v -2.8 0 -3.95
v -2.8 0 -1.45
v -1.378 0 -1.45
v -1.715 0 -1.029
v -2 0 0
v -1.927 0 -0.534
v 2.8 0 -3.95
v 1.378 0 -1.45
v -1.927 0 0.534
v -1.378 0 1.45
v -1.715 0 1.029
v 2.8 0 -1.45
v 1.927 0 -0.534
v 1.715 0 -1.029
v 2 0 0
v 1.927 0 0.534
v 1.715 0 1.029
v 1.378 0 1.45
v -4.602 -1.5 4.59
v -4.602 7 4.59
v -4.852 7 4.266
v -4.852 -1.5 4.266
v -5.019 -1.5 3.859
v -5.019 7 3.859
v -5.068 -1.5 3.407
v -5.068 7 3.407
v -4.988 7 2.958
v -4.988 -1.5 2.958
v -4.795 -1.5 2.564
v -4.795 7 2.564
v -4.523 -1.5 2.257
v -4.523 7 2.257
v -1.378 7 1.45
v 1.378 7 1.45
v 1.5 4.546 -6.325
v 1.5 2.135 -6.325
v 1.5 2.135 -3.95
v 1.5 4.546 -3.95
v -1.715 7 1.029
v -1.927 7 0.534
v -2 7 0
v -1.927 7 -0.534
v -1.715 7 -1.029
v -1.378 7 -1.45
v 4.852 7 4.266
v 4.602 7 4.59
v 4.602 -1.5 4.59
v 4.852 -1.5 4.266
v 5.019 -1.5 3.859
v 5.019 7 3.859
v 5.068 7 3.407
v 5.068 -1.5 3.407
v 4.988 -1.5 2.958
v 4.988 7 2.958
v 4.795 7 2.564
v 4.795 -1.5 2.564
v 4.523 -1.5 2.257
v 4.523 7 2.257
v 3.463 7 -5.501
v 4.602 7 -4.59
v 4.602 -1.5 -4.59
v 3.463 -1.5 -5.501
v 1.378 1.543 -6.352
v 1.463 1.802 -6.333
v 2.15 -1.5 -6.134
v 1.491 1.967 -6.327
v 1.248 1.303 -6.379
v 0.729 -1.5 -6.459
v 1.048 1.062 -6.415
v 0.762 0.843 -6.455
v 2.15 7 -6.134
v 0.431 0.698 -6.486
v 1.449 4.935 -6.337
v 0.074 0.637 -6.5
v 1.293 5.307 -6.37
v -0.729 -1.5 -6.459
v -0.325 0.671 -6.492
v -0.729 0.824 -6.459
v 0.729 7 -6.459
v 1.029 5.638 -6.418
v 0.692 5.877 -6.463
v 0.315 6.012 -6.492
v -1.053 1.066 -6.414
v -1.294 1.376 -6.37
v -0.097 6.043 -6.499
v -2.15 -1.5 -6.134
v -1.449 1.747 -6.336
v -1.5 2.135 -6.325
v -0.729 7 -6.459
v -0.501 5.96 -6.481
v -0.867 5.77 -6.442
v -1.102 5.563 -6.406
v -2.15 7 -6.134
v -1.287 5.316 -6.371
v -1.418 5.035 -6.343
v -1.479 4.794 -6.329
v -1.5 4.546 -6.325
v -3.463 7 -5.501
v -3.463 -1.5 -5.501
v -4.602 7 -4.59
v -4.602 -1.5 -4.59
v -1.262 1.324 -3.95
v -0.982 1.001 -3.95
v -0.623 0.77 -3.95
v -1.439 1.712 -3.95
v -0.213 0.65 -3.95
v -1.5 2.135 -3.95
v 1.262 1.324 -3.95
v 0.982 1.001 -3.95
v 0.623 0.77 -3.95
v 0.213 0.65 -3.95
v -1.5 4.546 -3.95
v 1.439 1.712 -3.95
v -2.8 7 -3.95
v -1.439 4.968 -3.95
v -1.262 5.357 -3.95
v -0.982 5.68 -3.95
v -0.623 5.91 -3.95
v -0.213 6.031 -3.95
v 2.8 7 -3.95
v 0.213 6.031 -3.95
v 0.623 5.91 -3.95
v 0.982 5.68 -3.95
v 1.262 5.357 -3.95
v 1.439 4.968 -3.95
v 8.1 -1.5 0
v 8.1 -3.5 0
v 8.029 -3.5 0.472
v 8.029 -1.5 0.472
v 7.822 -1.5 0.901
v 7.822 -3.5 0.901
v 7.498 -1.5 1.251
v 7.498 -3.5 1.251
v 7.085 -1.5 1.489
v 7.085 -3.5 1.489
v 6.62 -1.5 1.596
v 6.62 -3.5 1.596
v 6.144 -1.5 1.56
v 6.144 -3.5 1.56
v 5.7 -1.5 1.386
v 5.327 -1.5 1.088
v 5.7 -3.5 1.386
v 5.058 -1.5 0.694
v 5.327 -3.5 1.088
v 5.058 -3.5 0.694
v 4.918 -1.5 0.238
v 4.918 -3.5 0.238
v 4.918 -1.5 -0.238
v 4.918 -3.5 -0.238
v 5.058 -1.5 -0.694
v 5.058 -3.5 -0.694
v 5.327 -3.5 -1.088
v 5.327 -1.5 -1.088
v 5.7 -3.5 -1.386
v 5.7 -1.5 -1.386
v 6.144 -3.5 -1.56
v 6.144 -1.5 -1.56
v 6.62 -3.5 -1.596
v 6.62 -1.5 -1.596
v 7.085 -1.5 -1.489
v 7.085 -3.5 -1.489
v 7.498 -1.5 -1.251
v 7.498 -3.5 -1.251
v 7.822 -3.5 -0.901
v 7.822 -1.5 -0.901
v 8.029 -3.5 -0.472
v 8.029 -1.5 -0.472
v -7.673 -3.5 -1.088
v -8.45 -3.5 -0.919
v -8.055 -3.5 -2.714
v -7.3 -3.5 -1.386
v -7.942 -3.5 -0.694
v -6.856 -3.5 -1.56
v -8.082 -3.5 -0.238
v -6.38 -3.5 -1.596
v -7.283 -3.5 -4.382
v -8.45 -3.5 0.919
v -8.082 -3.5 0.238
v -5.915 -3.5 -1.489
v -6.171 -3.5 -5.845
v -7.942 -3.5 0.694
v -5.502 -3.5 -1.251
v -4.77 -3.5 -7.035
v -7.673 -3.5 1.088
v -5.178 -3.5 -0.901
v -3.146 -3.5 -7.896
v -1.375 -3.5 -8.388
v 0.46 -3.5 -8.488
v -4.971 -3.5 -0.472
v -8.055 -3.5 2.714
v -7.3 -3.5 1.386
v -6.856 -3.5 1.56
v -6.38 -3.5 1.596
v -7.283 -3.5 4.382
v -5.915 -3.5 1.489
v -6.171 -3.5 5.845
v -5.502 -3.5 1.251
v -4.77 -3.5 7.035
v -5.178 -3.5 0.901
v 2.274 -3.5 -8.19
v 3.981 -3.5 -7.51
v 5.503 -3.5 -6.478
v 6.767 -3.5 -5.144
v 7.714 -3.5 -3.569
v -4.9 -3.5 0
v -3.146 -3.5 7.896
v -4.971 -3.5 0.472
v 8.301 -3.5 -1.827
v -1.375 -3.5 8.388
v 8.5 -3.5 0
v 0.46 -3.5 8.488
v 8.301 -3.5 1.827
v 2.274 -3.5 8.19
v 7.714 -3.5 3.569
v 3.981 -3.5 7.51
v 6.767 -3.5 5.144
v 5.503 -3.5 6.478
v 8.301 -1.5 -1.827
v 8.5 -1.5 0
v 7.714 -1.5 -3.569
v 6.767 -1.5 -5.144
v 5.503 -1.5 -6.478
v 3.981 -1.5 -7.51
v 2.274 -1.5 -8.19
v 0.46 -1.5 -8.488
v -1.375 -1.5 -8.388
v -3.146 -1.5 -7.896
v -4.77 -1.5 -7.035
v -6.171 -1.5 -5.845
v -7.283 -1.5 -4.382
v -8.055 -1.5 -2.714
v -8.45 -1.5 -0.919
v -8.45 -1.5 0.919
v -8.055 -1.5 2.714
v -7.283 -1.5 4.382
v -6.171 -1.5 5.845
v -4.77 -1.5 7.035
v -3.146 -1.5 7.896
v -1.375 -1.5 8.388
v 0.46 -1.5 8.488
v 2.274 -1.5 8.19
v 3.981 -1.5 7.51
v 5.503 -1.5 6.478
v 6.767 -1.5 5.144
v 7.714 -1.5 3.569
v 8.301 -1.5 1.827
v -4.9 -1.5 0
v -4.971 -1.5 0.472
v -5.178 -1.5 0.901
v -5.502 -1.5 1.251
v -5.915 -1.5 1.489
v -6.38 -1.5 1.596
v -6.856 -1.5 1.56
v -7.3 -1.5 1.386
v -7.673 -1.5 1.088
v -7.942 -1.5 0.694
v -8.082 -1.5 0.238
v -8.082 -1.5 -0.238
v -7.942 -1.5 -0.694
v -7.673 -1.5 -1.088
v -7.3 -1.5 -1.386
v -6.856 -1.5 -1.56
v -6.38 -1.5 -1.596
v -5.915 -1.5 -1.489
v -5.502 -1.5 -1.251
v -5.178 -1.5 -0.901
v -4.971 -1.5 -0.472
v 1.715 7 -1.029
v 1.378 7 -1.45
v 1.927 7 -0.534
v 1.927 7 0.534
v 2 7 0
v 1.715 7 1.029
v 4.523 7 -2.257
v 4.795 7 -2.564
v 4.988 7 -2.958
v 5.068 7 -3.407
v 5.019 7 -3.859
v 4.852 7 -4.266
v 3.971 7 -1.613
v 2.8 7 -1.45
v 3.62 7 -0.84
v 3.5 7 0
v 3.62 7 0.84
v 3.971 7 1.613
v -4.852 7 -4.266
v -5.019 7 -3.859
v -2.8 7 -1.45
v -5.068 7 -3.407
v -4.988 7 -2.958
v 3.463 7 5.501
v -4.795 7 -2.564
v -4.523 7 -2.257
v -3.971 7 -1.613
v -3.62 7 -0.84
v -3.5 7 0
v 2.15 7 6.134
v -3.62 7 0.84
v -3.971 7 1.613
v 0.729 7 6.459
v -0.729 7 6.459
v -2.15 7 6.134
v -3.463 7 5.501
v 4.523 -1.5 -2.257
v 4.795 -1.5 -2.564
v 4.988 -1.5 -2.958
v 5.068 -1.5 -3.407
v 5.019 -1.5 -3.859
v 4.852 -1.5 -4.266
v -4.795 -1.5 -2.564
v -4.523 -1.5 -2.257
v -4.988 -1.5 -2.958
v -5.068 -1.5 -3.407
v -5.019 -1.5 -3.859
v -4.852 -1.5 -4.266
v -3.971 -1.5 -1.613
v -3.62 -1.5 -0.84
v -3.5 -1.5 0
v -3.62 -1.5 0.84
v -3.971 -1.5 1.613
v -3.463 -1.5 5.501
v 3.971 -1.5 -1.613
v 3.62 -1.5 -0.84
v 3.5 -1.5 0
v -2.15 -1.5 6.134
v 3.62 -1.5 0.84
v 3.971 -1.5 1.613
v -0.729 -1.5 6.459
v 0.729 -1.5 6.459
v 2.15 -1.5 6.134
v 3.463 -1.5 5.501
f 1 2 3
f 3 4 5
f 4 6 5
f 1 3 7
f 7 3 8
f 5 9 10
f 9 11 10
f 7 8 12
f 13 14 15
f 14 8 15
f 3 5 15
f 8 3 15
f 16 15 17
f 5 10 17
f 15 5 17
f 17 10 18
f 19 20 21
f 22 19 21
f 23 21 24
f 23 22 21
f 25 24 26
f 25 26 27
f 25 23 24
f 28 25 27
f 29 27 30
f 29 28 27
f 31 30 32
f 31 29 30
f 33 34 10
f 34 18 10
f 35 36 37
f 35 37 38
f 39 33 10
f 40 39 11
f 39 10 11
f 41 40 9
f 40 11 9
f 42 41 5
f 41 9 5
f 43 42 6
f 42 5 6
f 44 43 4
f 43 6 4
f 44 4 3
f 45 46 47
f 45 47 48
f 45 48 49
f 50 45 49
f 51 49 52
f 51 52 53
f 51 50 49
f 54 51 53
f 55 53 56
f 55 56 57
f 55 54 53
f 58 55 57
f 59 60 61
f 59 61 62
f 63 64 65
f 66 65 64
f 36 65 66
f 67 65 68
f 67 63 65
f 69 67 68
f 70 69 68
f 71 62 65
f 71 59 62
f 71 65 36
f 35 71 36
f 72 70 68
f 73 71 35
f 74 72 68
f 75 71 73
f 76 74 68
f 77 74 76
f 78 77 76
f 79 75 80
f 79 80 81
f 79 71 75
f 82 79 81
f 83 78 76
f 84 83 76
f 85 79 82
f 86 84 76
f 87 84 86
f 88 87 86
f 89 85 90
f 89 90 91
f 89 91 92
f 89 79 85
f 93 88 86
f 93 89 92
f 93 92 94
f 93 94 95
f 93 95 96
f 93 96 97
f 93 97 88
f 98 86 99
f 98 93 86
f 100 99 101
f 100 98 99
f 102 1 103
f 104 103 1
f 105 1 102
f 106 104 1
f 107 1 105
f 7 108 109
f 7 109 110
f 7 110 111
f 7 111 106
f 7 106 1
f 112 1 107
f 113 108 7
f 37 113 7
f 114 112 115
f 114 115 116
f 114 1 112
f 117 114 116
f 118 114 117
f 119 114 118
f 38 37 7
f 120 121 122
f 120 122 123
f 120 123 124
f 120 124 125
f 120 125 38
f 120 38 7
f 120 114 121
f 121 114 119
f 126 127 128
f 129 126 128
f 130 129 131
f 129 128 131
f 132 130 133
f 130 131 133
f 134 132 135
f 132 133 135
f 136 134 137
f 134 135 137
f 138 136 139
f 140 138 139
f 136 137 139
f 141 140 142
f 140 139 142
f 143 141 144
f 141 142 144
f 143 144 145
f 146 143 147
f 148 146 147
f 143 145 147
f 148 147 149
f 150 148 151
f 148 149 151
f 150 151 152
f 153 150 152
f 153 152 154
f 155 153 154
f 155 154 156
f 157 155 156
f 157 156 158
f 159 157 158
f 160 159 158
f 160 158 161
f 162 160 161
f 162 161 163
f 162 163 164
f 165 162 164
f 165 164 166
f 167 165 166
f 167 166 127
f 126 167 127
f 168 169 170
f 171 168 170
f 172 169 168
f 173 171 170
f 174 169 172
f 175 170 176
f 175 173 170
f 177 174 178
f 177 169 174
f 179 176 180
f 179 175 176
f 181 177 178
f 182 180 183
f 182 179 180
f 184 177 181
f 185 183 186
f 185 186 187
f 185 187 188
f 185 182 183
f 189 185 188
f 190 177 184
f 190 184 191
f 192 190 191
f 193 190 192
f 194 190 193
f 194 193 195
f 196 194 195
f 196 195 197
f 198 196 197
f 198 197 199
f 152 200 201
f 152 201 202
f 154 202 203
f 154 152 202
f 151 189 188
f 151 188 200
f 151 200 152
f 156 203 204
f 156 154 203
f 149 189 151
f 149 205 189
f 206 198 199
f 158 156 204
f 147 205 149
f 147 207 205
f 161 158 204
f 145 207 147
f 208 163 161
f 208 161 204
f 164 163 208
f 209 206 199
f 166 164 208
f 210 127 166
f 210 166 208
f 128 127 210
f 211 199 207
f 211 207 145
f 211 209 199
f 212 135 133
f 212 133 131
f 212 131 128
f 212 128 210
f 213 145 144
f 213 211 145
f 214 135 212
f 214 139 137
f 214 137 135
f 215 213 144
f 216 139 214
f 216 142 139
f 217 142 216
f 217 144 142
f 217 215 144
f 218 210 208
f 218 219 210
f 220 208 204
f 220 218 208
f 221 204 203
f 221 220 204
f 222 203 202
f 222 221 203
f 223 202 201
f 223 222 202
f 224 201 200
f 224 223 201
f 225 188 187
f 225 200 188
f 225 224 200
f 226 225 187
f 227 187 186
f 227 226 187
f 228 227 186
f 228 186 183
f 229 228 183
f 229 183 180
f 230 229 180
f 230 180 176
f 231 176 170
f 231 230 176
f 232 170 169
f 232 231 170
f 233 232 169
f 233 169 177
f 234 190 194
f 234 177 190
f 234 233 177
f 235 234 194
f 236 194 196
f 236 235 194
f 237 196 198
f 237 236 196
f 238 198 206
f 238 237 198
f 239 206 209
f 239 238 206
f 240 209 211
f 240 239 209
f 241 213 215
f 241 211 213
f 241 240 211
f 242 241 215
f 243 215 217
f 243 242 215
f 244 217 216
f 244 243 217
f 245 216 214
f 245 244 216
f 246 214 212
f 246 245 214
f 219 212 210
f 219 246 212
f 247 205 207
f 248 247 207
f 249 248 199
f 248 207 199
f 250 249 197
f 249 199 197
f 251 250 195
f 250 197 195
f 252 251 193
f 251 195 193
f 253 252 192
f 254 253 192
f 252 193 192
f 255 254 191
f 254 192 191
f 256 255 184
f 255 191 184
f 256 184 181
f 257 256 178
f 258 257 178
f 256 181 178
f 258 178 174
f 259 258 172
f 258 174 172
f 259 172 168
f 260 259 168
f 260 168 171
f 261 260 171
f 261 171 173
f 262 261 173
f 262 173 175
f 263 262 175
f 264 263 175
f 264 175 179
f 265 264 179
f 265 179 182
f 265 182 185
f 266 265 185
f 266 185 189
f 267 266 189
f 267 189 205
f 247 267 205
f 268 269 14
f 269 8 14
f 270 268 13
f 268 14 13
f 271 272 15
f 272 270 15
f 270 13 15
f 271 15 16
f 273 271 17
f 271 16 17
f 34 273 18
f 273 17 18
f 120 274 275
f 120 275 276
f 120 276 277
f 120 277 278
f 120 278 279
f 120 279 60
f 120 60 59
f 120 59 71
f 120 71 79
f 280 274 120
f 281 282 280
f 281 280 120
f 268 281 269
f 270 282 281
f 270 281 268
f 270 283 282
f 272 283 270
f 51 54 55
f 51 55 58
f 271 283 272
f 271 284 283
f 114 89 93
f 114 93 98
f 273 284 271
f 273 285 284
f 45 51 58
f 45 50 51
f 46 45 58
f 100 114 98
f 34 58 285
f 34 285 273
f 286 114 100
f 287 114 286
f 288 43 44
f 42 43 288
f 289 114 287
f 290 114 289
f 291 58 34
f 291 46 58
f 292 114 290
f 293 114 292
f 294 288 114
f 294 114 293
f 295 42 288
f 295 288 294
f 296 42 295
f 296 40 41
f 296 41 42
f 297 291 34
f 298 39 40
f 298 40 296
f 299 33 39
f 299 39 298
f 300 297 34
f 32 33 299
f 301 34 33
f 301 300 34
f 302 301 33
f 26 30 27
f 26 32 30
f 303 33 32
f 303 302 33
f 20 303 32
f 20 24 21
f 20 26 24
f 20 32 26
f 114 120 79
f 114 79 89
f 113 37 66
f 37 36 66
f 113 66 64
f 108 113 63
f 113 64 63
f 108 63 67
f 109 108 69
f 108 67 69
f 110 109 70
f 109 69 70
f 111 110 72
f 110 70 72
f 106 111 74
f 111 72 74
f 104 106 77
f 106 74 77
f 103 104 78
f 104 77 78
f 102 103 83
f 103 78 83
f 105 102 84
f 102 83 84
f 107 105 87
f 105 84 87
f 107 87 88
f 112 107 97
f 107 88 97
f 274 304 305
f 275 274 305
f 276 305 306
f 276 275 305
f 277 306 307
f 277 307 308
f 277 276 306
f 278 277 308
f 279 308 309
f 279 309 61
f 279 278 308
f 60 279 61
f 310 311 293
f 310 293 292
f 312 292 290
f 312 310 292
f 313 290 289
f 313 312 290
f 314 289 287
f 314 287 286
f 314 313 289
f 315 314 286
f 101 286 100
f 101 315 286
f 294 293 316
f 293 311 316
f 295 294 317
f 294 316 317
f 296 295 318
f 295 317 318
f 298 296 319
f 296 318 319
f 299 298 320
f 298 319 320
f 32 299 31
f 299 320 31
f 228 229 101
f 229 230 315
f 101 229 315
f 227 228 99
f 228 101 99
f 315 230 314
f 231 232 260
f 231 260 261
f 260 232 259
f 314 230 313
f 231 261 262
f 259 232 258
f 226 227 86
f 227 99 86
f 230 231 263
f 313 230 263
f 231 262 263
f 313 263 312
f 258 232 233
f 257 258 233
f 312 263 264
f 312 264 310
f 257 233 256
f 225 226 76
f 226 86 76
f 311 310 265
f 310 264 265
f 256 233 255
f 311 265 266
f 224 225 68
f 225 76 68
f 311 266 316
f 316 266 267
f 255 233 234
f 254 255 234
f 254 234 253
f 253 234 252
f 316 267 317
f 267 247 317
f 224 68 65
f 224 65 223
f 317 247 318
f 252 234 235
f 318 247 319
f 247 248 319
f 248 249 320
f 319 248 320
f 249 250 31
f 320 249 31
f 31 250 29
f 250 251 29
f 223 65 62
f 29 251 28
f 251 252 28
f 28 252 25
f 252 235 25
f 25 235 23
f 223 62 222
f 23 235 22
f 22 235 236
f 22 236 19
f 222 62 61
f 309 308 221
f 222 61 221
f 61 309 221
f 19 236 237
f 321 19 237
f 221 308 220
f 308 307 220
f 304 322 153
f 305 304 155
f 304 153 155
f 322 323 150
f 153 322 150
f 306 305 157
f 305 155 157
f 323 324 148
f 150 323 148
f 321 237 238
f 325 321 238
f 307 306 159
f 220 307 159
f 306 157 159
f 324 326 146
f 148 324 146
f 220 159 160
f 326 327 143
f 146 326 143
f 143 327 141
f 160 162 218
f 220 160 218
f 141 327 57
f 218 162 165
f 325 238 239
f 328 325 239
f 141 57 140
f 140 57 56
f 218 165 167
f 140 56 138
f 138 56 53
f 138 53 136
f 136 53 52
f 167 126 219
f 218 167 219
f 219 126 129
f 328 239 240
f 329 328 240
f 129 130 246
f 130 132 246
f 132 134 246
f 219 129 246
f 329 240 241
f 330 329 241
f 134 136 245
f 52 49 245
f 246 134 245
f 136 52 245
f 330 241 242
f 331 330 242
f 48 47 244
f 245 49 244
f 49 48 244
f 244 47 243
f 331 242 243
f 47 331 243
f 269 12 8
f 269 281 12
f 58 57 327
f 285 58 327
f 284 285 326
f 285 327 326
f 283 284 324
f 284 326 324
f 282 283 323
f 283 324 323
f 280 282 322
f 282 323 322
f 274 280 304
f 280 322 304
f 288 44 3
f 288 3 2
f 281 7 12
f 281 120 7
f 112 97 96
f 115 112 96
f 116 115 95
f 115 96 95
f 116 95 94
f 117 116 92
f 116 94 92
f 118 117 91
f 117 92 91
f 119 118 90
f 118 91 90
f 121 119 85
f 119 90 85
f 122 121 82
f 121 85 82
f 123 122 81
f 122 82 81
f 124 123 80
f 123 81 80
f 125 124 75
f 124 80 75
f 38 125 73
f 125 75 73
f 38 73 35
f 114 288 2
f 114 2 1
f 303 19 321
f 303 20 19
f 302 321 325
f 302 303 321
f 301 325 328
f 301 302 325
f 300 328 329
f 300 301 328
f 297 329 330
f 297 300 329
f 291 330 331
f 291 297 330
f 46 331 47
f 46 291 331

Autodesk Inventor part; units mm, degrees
ref_plane "YZ Plane" through (0, 0, 0) normal (1, 0, 0) x (0, 1, 0)
ref_plane "XZ Plane" through (0, 0, 0) normal (0, 1, 0) x (-1, 0, 0)
sketch "Sketch1" plane through (0, 0, 0) normal (0, 1, 0) x (-1, 0, 0)
  circle A0 centre (0, 0) radius 4.5
  circle A1 centre (0, 0) radius 2
  circle A2 centre (0, 0) radius 1.45
  line L0 (0, -1.45) -> (1.3775, -1.45)
  line L1 (0, -1.45) -> (-1.3775, -1.45)
  line L2 (0, 1.45) -> (-1.3775, 1.45)
  line L3 (0, 1.45) -> (1.3775, 1.45)
  dimension "d0" = 9
  dimension "d1" = 4
  dimension "d2" = 2.9
extrude "Extrusion1" add sketch "Sketch1" along normal blind 7 contours A0 | L3 L2 A1 | A1 L1 L0
sketch "Sketch2" plane through (0, 7, 0) normal (0, 1, 0) x (1, 0, 0)
  line L0 (-1.3775, 1.45) -> (1.3775, 1.45) projected
  line L1 (0, 1.45) -> (0, 3.85)
  line L2 (1.3775, -0.95) -> (-1.3775, -0.95)
  line L3 (-1.3775, -0.95) -> (-1.3775, 3.85)
  line L4 (-1.3775, 3.85) -> (1.3775, 3.85)
  line L5 (1.3775, 3.85) -> (1.3775, -0.95)
  line L6 (1.3775, -0.95) -> (-1.3775, 3.85) construction
  line L7 (-1.3775, -0.95) -> (1.3775, 3.85) construction
  line L8 (2.75, -0.95) -> (-2.75, -0.95)
  line L9 (-2.75, -0.95) -> (-2.75, 3.85)
  line L10 (-2.75, 3.85) -> (2.75, 3.85)
  line L11 (2.75, 3.85) -> (2.75, -0.95)
  line L12 (2.75, -0.95) -> (-2.75, 3.85) construction
  line L13 (-2.75, -0.95) -> (2.75, 3.85) construction
  circle A0 centre (0, 0) radius 6.5
  circle A1 centre (0, 0) radius 4.5
  dimension "d5" = 2.4
  dimension "d6" = 5.5
  dimension "d7" = 13
extrude "Extrusion2" add sketch "Sketch2" against normal blind 7 contours A1 L9 L10 | L10 L11 A1 | A0
sketch "Sketch3" plane through (0, 7, 0) normal (0, 1, 0) x (1, 0, 0)
  line L0 (-1.3775, 1.45) -> (1.3775, 1.45) projected
  line L1 (0, 1.45) -> (0, 3.95)
  line L2 (2.8, -1.05) -> (-2.8, -1.05)
  line L3 (-2.8, -1.05) -> (-2.8, 3.95)
  line L4 (-2.8, 3.95) -> (2.8, 3.95)
  line L5 (2.8, 3.95) -> (2.8, -1.05)
  line L6 (2.8, -1.05) -> (-2.8, 3.95) construction
  line L7 (-2.8, -1.05) -> (2.8, 3.95) construction
  line L8 (0, 1.45) -> (-2.8, 1.45)
  line L9 (0, 1.45) -> (2.8, 1.45)
  point P0 (0, 0)
  dimension "d10" = 2.5
  dimension "d11" = 5.6
extrude "Extrusion3" cut sketch "Sketch3" against normal blind 7 contours L8 L3 L4 L1 L0 | L1 L4 L5 L9 L0
ref_plane "Work Plane1" through (-2.8, 7, -8.95) normal (0, 0, 1) x (1, 0, 0)
sketch "Sketch5" plane through (-2.8, 7, -8.95) normal (0, 0, 1) x (1, 0, 0)
  circle A0 centre (2.8, -2.4541) radius 1.5
  line L0 (2.8, -2.4541) -> (2.8, -7)
  circle A1 centre (2.8, -3.9541) radius 1.5
  circle A2 centre (2.8, -4.8651) radius 1.5
  line L1 (1.3, -4.8651) -> (1.3, -2.4541)
  line L2 (4.3, -4.8651) -> (4.3, -2.4541)
  point P0 (4.3, -4.8651)
  dimension "d17" = 3
  dimension "d15" = 3
  dimension "d16" = 3
extrude "Extrusion4" cut sketch "Sketch5" along normal blind 6
sketch "Sketch6" plane through (0, 0, 0) normal (0, -1, 0) x (1, 0, 0)
  circle A0 centre (0, 0) radius 6.5
extrude "Extrusion5" add sketch "Sketch6" along normal blind 1.5
sketch "Sketch7" plane through (0, -1.5, 0) normal (0, -1, 0) x (1, 0, 0)
  line L0 (-3.5, -3.5) -> (3.5, -3.5)
  line L1 (3.5, -3.5) -> (3.5, 3.5)
  line L2 (3.5, 3.5) -> (-3.5, 3.5)
  line L3 (-3.5, 3.5) -> (-3.5, -3.5)
  line L4 (-3.5, -3.5) -> (3.5, 3.5) construction
  line L5 (3.5, -3.5) -> (-3.5, 3.5) construction
  point P0 (0, 0)
  dimension "d22" = 7
  dimension "d23" = 7
extrude "Extrusion6" add sketch "Sketch7" along normal blind 6
sketch "Sketch8" plane through (0, -1.5, 0) normal (0, -1, 0) x (1, 0, 0)
  arc A0 (-1.3775, 1.45) -> (-1.3775, -1.45) centre (0, 0) ccw projected
  circle A1 centre (0, 0) radius 8.6758
extrude "Extrusion7" cut sketch "Sketch8" along normal blind 10
sketch "Sketch9" plane through (0, -1.5, 0) normal (0, -1, 0) x (1, 0, 0)
  point P0 (0, 0)
sketch "Sketch10" plane through (0, -1.5, 0) normal (0, -1, 0) x (1, 0, 0)
  circle A0 centre (0, 0) radius 6.5
  circle A1 centre (6.5, 0) radius 3
  circle A2 centre (-6.5, 0) radius 3
  dimension "d28" = 13
  dimension "d29" = 6
  dimension "d30" = 6
extrude "Extrusion8" cut sketch "Sketch10" against normal through all contours A0 A1 | A0 A1 | A2 A0 | A0 A2
sketch "Sketch11" plane through (0, -1.5, 0) normal (0, -1, 0) x (1, 0, 0)
  circle A0 centre (0, 0) radius 8.5
  dimension "d33" = 17
extrude "Extrusion9" add sketch "Sketch11" along normal blind 2
sketch "Sketch12" plane through (0, -3.5, 0) normal (0, -1, 0) x (1, 0, 0)
  arc A0 (1.3775, -1.45) -> (1.3775, 1.45) centre (0, 0) ccw projected
  circle A1 centre (0, 0) radius 6.5
  arc A2 (-5.8077, -2.919) -> (-5.8077, 2.919) centre (-6.5, 0) ccw projected
  circle A3 centre (-6.5, 0) radius 1.6
  circle A4 centre (6.5, 0) radius 1.6
  dimension "d36" = 13
  dimension "d37" = 3.2
  dimension "d38" = 3.2
extrude "Extrusion10" cut sketch "Sketch12" against normal through all contours A1 A4 | A1 A4 | A3 A1 | A1 A3
fillet "Fillet1" radius 1.6 4 edges at (5.8077, 2.75, 2.919) (5.8077, 2.75, -2.919) (-5.8077, 2.75, 2.919) (-5.8077, 2.75, -2.919)
properties part number "acople"
